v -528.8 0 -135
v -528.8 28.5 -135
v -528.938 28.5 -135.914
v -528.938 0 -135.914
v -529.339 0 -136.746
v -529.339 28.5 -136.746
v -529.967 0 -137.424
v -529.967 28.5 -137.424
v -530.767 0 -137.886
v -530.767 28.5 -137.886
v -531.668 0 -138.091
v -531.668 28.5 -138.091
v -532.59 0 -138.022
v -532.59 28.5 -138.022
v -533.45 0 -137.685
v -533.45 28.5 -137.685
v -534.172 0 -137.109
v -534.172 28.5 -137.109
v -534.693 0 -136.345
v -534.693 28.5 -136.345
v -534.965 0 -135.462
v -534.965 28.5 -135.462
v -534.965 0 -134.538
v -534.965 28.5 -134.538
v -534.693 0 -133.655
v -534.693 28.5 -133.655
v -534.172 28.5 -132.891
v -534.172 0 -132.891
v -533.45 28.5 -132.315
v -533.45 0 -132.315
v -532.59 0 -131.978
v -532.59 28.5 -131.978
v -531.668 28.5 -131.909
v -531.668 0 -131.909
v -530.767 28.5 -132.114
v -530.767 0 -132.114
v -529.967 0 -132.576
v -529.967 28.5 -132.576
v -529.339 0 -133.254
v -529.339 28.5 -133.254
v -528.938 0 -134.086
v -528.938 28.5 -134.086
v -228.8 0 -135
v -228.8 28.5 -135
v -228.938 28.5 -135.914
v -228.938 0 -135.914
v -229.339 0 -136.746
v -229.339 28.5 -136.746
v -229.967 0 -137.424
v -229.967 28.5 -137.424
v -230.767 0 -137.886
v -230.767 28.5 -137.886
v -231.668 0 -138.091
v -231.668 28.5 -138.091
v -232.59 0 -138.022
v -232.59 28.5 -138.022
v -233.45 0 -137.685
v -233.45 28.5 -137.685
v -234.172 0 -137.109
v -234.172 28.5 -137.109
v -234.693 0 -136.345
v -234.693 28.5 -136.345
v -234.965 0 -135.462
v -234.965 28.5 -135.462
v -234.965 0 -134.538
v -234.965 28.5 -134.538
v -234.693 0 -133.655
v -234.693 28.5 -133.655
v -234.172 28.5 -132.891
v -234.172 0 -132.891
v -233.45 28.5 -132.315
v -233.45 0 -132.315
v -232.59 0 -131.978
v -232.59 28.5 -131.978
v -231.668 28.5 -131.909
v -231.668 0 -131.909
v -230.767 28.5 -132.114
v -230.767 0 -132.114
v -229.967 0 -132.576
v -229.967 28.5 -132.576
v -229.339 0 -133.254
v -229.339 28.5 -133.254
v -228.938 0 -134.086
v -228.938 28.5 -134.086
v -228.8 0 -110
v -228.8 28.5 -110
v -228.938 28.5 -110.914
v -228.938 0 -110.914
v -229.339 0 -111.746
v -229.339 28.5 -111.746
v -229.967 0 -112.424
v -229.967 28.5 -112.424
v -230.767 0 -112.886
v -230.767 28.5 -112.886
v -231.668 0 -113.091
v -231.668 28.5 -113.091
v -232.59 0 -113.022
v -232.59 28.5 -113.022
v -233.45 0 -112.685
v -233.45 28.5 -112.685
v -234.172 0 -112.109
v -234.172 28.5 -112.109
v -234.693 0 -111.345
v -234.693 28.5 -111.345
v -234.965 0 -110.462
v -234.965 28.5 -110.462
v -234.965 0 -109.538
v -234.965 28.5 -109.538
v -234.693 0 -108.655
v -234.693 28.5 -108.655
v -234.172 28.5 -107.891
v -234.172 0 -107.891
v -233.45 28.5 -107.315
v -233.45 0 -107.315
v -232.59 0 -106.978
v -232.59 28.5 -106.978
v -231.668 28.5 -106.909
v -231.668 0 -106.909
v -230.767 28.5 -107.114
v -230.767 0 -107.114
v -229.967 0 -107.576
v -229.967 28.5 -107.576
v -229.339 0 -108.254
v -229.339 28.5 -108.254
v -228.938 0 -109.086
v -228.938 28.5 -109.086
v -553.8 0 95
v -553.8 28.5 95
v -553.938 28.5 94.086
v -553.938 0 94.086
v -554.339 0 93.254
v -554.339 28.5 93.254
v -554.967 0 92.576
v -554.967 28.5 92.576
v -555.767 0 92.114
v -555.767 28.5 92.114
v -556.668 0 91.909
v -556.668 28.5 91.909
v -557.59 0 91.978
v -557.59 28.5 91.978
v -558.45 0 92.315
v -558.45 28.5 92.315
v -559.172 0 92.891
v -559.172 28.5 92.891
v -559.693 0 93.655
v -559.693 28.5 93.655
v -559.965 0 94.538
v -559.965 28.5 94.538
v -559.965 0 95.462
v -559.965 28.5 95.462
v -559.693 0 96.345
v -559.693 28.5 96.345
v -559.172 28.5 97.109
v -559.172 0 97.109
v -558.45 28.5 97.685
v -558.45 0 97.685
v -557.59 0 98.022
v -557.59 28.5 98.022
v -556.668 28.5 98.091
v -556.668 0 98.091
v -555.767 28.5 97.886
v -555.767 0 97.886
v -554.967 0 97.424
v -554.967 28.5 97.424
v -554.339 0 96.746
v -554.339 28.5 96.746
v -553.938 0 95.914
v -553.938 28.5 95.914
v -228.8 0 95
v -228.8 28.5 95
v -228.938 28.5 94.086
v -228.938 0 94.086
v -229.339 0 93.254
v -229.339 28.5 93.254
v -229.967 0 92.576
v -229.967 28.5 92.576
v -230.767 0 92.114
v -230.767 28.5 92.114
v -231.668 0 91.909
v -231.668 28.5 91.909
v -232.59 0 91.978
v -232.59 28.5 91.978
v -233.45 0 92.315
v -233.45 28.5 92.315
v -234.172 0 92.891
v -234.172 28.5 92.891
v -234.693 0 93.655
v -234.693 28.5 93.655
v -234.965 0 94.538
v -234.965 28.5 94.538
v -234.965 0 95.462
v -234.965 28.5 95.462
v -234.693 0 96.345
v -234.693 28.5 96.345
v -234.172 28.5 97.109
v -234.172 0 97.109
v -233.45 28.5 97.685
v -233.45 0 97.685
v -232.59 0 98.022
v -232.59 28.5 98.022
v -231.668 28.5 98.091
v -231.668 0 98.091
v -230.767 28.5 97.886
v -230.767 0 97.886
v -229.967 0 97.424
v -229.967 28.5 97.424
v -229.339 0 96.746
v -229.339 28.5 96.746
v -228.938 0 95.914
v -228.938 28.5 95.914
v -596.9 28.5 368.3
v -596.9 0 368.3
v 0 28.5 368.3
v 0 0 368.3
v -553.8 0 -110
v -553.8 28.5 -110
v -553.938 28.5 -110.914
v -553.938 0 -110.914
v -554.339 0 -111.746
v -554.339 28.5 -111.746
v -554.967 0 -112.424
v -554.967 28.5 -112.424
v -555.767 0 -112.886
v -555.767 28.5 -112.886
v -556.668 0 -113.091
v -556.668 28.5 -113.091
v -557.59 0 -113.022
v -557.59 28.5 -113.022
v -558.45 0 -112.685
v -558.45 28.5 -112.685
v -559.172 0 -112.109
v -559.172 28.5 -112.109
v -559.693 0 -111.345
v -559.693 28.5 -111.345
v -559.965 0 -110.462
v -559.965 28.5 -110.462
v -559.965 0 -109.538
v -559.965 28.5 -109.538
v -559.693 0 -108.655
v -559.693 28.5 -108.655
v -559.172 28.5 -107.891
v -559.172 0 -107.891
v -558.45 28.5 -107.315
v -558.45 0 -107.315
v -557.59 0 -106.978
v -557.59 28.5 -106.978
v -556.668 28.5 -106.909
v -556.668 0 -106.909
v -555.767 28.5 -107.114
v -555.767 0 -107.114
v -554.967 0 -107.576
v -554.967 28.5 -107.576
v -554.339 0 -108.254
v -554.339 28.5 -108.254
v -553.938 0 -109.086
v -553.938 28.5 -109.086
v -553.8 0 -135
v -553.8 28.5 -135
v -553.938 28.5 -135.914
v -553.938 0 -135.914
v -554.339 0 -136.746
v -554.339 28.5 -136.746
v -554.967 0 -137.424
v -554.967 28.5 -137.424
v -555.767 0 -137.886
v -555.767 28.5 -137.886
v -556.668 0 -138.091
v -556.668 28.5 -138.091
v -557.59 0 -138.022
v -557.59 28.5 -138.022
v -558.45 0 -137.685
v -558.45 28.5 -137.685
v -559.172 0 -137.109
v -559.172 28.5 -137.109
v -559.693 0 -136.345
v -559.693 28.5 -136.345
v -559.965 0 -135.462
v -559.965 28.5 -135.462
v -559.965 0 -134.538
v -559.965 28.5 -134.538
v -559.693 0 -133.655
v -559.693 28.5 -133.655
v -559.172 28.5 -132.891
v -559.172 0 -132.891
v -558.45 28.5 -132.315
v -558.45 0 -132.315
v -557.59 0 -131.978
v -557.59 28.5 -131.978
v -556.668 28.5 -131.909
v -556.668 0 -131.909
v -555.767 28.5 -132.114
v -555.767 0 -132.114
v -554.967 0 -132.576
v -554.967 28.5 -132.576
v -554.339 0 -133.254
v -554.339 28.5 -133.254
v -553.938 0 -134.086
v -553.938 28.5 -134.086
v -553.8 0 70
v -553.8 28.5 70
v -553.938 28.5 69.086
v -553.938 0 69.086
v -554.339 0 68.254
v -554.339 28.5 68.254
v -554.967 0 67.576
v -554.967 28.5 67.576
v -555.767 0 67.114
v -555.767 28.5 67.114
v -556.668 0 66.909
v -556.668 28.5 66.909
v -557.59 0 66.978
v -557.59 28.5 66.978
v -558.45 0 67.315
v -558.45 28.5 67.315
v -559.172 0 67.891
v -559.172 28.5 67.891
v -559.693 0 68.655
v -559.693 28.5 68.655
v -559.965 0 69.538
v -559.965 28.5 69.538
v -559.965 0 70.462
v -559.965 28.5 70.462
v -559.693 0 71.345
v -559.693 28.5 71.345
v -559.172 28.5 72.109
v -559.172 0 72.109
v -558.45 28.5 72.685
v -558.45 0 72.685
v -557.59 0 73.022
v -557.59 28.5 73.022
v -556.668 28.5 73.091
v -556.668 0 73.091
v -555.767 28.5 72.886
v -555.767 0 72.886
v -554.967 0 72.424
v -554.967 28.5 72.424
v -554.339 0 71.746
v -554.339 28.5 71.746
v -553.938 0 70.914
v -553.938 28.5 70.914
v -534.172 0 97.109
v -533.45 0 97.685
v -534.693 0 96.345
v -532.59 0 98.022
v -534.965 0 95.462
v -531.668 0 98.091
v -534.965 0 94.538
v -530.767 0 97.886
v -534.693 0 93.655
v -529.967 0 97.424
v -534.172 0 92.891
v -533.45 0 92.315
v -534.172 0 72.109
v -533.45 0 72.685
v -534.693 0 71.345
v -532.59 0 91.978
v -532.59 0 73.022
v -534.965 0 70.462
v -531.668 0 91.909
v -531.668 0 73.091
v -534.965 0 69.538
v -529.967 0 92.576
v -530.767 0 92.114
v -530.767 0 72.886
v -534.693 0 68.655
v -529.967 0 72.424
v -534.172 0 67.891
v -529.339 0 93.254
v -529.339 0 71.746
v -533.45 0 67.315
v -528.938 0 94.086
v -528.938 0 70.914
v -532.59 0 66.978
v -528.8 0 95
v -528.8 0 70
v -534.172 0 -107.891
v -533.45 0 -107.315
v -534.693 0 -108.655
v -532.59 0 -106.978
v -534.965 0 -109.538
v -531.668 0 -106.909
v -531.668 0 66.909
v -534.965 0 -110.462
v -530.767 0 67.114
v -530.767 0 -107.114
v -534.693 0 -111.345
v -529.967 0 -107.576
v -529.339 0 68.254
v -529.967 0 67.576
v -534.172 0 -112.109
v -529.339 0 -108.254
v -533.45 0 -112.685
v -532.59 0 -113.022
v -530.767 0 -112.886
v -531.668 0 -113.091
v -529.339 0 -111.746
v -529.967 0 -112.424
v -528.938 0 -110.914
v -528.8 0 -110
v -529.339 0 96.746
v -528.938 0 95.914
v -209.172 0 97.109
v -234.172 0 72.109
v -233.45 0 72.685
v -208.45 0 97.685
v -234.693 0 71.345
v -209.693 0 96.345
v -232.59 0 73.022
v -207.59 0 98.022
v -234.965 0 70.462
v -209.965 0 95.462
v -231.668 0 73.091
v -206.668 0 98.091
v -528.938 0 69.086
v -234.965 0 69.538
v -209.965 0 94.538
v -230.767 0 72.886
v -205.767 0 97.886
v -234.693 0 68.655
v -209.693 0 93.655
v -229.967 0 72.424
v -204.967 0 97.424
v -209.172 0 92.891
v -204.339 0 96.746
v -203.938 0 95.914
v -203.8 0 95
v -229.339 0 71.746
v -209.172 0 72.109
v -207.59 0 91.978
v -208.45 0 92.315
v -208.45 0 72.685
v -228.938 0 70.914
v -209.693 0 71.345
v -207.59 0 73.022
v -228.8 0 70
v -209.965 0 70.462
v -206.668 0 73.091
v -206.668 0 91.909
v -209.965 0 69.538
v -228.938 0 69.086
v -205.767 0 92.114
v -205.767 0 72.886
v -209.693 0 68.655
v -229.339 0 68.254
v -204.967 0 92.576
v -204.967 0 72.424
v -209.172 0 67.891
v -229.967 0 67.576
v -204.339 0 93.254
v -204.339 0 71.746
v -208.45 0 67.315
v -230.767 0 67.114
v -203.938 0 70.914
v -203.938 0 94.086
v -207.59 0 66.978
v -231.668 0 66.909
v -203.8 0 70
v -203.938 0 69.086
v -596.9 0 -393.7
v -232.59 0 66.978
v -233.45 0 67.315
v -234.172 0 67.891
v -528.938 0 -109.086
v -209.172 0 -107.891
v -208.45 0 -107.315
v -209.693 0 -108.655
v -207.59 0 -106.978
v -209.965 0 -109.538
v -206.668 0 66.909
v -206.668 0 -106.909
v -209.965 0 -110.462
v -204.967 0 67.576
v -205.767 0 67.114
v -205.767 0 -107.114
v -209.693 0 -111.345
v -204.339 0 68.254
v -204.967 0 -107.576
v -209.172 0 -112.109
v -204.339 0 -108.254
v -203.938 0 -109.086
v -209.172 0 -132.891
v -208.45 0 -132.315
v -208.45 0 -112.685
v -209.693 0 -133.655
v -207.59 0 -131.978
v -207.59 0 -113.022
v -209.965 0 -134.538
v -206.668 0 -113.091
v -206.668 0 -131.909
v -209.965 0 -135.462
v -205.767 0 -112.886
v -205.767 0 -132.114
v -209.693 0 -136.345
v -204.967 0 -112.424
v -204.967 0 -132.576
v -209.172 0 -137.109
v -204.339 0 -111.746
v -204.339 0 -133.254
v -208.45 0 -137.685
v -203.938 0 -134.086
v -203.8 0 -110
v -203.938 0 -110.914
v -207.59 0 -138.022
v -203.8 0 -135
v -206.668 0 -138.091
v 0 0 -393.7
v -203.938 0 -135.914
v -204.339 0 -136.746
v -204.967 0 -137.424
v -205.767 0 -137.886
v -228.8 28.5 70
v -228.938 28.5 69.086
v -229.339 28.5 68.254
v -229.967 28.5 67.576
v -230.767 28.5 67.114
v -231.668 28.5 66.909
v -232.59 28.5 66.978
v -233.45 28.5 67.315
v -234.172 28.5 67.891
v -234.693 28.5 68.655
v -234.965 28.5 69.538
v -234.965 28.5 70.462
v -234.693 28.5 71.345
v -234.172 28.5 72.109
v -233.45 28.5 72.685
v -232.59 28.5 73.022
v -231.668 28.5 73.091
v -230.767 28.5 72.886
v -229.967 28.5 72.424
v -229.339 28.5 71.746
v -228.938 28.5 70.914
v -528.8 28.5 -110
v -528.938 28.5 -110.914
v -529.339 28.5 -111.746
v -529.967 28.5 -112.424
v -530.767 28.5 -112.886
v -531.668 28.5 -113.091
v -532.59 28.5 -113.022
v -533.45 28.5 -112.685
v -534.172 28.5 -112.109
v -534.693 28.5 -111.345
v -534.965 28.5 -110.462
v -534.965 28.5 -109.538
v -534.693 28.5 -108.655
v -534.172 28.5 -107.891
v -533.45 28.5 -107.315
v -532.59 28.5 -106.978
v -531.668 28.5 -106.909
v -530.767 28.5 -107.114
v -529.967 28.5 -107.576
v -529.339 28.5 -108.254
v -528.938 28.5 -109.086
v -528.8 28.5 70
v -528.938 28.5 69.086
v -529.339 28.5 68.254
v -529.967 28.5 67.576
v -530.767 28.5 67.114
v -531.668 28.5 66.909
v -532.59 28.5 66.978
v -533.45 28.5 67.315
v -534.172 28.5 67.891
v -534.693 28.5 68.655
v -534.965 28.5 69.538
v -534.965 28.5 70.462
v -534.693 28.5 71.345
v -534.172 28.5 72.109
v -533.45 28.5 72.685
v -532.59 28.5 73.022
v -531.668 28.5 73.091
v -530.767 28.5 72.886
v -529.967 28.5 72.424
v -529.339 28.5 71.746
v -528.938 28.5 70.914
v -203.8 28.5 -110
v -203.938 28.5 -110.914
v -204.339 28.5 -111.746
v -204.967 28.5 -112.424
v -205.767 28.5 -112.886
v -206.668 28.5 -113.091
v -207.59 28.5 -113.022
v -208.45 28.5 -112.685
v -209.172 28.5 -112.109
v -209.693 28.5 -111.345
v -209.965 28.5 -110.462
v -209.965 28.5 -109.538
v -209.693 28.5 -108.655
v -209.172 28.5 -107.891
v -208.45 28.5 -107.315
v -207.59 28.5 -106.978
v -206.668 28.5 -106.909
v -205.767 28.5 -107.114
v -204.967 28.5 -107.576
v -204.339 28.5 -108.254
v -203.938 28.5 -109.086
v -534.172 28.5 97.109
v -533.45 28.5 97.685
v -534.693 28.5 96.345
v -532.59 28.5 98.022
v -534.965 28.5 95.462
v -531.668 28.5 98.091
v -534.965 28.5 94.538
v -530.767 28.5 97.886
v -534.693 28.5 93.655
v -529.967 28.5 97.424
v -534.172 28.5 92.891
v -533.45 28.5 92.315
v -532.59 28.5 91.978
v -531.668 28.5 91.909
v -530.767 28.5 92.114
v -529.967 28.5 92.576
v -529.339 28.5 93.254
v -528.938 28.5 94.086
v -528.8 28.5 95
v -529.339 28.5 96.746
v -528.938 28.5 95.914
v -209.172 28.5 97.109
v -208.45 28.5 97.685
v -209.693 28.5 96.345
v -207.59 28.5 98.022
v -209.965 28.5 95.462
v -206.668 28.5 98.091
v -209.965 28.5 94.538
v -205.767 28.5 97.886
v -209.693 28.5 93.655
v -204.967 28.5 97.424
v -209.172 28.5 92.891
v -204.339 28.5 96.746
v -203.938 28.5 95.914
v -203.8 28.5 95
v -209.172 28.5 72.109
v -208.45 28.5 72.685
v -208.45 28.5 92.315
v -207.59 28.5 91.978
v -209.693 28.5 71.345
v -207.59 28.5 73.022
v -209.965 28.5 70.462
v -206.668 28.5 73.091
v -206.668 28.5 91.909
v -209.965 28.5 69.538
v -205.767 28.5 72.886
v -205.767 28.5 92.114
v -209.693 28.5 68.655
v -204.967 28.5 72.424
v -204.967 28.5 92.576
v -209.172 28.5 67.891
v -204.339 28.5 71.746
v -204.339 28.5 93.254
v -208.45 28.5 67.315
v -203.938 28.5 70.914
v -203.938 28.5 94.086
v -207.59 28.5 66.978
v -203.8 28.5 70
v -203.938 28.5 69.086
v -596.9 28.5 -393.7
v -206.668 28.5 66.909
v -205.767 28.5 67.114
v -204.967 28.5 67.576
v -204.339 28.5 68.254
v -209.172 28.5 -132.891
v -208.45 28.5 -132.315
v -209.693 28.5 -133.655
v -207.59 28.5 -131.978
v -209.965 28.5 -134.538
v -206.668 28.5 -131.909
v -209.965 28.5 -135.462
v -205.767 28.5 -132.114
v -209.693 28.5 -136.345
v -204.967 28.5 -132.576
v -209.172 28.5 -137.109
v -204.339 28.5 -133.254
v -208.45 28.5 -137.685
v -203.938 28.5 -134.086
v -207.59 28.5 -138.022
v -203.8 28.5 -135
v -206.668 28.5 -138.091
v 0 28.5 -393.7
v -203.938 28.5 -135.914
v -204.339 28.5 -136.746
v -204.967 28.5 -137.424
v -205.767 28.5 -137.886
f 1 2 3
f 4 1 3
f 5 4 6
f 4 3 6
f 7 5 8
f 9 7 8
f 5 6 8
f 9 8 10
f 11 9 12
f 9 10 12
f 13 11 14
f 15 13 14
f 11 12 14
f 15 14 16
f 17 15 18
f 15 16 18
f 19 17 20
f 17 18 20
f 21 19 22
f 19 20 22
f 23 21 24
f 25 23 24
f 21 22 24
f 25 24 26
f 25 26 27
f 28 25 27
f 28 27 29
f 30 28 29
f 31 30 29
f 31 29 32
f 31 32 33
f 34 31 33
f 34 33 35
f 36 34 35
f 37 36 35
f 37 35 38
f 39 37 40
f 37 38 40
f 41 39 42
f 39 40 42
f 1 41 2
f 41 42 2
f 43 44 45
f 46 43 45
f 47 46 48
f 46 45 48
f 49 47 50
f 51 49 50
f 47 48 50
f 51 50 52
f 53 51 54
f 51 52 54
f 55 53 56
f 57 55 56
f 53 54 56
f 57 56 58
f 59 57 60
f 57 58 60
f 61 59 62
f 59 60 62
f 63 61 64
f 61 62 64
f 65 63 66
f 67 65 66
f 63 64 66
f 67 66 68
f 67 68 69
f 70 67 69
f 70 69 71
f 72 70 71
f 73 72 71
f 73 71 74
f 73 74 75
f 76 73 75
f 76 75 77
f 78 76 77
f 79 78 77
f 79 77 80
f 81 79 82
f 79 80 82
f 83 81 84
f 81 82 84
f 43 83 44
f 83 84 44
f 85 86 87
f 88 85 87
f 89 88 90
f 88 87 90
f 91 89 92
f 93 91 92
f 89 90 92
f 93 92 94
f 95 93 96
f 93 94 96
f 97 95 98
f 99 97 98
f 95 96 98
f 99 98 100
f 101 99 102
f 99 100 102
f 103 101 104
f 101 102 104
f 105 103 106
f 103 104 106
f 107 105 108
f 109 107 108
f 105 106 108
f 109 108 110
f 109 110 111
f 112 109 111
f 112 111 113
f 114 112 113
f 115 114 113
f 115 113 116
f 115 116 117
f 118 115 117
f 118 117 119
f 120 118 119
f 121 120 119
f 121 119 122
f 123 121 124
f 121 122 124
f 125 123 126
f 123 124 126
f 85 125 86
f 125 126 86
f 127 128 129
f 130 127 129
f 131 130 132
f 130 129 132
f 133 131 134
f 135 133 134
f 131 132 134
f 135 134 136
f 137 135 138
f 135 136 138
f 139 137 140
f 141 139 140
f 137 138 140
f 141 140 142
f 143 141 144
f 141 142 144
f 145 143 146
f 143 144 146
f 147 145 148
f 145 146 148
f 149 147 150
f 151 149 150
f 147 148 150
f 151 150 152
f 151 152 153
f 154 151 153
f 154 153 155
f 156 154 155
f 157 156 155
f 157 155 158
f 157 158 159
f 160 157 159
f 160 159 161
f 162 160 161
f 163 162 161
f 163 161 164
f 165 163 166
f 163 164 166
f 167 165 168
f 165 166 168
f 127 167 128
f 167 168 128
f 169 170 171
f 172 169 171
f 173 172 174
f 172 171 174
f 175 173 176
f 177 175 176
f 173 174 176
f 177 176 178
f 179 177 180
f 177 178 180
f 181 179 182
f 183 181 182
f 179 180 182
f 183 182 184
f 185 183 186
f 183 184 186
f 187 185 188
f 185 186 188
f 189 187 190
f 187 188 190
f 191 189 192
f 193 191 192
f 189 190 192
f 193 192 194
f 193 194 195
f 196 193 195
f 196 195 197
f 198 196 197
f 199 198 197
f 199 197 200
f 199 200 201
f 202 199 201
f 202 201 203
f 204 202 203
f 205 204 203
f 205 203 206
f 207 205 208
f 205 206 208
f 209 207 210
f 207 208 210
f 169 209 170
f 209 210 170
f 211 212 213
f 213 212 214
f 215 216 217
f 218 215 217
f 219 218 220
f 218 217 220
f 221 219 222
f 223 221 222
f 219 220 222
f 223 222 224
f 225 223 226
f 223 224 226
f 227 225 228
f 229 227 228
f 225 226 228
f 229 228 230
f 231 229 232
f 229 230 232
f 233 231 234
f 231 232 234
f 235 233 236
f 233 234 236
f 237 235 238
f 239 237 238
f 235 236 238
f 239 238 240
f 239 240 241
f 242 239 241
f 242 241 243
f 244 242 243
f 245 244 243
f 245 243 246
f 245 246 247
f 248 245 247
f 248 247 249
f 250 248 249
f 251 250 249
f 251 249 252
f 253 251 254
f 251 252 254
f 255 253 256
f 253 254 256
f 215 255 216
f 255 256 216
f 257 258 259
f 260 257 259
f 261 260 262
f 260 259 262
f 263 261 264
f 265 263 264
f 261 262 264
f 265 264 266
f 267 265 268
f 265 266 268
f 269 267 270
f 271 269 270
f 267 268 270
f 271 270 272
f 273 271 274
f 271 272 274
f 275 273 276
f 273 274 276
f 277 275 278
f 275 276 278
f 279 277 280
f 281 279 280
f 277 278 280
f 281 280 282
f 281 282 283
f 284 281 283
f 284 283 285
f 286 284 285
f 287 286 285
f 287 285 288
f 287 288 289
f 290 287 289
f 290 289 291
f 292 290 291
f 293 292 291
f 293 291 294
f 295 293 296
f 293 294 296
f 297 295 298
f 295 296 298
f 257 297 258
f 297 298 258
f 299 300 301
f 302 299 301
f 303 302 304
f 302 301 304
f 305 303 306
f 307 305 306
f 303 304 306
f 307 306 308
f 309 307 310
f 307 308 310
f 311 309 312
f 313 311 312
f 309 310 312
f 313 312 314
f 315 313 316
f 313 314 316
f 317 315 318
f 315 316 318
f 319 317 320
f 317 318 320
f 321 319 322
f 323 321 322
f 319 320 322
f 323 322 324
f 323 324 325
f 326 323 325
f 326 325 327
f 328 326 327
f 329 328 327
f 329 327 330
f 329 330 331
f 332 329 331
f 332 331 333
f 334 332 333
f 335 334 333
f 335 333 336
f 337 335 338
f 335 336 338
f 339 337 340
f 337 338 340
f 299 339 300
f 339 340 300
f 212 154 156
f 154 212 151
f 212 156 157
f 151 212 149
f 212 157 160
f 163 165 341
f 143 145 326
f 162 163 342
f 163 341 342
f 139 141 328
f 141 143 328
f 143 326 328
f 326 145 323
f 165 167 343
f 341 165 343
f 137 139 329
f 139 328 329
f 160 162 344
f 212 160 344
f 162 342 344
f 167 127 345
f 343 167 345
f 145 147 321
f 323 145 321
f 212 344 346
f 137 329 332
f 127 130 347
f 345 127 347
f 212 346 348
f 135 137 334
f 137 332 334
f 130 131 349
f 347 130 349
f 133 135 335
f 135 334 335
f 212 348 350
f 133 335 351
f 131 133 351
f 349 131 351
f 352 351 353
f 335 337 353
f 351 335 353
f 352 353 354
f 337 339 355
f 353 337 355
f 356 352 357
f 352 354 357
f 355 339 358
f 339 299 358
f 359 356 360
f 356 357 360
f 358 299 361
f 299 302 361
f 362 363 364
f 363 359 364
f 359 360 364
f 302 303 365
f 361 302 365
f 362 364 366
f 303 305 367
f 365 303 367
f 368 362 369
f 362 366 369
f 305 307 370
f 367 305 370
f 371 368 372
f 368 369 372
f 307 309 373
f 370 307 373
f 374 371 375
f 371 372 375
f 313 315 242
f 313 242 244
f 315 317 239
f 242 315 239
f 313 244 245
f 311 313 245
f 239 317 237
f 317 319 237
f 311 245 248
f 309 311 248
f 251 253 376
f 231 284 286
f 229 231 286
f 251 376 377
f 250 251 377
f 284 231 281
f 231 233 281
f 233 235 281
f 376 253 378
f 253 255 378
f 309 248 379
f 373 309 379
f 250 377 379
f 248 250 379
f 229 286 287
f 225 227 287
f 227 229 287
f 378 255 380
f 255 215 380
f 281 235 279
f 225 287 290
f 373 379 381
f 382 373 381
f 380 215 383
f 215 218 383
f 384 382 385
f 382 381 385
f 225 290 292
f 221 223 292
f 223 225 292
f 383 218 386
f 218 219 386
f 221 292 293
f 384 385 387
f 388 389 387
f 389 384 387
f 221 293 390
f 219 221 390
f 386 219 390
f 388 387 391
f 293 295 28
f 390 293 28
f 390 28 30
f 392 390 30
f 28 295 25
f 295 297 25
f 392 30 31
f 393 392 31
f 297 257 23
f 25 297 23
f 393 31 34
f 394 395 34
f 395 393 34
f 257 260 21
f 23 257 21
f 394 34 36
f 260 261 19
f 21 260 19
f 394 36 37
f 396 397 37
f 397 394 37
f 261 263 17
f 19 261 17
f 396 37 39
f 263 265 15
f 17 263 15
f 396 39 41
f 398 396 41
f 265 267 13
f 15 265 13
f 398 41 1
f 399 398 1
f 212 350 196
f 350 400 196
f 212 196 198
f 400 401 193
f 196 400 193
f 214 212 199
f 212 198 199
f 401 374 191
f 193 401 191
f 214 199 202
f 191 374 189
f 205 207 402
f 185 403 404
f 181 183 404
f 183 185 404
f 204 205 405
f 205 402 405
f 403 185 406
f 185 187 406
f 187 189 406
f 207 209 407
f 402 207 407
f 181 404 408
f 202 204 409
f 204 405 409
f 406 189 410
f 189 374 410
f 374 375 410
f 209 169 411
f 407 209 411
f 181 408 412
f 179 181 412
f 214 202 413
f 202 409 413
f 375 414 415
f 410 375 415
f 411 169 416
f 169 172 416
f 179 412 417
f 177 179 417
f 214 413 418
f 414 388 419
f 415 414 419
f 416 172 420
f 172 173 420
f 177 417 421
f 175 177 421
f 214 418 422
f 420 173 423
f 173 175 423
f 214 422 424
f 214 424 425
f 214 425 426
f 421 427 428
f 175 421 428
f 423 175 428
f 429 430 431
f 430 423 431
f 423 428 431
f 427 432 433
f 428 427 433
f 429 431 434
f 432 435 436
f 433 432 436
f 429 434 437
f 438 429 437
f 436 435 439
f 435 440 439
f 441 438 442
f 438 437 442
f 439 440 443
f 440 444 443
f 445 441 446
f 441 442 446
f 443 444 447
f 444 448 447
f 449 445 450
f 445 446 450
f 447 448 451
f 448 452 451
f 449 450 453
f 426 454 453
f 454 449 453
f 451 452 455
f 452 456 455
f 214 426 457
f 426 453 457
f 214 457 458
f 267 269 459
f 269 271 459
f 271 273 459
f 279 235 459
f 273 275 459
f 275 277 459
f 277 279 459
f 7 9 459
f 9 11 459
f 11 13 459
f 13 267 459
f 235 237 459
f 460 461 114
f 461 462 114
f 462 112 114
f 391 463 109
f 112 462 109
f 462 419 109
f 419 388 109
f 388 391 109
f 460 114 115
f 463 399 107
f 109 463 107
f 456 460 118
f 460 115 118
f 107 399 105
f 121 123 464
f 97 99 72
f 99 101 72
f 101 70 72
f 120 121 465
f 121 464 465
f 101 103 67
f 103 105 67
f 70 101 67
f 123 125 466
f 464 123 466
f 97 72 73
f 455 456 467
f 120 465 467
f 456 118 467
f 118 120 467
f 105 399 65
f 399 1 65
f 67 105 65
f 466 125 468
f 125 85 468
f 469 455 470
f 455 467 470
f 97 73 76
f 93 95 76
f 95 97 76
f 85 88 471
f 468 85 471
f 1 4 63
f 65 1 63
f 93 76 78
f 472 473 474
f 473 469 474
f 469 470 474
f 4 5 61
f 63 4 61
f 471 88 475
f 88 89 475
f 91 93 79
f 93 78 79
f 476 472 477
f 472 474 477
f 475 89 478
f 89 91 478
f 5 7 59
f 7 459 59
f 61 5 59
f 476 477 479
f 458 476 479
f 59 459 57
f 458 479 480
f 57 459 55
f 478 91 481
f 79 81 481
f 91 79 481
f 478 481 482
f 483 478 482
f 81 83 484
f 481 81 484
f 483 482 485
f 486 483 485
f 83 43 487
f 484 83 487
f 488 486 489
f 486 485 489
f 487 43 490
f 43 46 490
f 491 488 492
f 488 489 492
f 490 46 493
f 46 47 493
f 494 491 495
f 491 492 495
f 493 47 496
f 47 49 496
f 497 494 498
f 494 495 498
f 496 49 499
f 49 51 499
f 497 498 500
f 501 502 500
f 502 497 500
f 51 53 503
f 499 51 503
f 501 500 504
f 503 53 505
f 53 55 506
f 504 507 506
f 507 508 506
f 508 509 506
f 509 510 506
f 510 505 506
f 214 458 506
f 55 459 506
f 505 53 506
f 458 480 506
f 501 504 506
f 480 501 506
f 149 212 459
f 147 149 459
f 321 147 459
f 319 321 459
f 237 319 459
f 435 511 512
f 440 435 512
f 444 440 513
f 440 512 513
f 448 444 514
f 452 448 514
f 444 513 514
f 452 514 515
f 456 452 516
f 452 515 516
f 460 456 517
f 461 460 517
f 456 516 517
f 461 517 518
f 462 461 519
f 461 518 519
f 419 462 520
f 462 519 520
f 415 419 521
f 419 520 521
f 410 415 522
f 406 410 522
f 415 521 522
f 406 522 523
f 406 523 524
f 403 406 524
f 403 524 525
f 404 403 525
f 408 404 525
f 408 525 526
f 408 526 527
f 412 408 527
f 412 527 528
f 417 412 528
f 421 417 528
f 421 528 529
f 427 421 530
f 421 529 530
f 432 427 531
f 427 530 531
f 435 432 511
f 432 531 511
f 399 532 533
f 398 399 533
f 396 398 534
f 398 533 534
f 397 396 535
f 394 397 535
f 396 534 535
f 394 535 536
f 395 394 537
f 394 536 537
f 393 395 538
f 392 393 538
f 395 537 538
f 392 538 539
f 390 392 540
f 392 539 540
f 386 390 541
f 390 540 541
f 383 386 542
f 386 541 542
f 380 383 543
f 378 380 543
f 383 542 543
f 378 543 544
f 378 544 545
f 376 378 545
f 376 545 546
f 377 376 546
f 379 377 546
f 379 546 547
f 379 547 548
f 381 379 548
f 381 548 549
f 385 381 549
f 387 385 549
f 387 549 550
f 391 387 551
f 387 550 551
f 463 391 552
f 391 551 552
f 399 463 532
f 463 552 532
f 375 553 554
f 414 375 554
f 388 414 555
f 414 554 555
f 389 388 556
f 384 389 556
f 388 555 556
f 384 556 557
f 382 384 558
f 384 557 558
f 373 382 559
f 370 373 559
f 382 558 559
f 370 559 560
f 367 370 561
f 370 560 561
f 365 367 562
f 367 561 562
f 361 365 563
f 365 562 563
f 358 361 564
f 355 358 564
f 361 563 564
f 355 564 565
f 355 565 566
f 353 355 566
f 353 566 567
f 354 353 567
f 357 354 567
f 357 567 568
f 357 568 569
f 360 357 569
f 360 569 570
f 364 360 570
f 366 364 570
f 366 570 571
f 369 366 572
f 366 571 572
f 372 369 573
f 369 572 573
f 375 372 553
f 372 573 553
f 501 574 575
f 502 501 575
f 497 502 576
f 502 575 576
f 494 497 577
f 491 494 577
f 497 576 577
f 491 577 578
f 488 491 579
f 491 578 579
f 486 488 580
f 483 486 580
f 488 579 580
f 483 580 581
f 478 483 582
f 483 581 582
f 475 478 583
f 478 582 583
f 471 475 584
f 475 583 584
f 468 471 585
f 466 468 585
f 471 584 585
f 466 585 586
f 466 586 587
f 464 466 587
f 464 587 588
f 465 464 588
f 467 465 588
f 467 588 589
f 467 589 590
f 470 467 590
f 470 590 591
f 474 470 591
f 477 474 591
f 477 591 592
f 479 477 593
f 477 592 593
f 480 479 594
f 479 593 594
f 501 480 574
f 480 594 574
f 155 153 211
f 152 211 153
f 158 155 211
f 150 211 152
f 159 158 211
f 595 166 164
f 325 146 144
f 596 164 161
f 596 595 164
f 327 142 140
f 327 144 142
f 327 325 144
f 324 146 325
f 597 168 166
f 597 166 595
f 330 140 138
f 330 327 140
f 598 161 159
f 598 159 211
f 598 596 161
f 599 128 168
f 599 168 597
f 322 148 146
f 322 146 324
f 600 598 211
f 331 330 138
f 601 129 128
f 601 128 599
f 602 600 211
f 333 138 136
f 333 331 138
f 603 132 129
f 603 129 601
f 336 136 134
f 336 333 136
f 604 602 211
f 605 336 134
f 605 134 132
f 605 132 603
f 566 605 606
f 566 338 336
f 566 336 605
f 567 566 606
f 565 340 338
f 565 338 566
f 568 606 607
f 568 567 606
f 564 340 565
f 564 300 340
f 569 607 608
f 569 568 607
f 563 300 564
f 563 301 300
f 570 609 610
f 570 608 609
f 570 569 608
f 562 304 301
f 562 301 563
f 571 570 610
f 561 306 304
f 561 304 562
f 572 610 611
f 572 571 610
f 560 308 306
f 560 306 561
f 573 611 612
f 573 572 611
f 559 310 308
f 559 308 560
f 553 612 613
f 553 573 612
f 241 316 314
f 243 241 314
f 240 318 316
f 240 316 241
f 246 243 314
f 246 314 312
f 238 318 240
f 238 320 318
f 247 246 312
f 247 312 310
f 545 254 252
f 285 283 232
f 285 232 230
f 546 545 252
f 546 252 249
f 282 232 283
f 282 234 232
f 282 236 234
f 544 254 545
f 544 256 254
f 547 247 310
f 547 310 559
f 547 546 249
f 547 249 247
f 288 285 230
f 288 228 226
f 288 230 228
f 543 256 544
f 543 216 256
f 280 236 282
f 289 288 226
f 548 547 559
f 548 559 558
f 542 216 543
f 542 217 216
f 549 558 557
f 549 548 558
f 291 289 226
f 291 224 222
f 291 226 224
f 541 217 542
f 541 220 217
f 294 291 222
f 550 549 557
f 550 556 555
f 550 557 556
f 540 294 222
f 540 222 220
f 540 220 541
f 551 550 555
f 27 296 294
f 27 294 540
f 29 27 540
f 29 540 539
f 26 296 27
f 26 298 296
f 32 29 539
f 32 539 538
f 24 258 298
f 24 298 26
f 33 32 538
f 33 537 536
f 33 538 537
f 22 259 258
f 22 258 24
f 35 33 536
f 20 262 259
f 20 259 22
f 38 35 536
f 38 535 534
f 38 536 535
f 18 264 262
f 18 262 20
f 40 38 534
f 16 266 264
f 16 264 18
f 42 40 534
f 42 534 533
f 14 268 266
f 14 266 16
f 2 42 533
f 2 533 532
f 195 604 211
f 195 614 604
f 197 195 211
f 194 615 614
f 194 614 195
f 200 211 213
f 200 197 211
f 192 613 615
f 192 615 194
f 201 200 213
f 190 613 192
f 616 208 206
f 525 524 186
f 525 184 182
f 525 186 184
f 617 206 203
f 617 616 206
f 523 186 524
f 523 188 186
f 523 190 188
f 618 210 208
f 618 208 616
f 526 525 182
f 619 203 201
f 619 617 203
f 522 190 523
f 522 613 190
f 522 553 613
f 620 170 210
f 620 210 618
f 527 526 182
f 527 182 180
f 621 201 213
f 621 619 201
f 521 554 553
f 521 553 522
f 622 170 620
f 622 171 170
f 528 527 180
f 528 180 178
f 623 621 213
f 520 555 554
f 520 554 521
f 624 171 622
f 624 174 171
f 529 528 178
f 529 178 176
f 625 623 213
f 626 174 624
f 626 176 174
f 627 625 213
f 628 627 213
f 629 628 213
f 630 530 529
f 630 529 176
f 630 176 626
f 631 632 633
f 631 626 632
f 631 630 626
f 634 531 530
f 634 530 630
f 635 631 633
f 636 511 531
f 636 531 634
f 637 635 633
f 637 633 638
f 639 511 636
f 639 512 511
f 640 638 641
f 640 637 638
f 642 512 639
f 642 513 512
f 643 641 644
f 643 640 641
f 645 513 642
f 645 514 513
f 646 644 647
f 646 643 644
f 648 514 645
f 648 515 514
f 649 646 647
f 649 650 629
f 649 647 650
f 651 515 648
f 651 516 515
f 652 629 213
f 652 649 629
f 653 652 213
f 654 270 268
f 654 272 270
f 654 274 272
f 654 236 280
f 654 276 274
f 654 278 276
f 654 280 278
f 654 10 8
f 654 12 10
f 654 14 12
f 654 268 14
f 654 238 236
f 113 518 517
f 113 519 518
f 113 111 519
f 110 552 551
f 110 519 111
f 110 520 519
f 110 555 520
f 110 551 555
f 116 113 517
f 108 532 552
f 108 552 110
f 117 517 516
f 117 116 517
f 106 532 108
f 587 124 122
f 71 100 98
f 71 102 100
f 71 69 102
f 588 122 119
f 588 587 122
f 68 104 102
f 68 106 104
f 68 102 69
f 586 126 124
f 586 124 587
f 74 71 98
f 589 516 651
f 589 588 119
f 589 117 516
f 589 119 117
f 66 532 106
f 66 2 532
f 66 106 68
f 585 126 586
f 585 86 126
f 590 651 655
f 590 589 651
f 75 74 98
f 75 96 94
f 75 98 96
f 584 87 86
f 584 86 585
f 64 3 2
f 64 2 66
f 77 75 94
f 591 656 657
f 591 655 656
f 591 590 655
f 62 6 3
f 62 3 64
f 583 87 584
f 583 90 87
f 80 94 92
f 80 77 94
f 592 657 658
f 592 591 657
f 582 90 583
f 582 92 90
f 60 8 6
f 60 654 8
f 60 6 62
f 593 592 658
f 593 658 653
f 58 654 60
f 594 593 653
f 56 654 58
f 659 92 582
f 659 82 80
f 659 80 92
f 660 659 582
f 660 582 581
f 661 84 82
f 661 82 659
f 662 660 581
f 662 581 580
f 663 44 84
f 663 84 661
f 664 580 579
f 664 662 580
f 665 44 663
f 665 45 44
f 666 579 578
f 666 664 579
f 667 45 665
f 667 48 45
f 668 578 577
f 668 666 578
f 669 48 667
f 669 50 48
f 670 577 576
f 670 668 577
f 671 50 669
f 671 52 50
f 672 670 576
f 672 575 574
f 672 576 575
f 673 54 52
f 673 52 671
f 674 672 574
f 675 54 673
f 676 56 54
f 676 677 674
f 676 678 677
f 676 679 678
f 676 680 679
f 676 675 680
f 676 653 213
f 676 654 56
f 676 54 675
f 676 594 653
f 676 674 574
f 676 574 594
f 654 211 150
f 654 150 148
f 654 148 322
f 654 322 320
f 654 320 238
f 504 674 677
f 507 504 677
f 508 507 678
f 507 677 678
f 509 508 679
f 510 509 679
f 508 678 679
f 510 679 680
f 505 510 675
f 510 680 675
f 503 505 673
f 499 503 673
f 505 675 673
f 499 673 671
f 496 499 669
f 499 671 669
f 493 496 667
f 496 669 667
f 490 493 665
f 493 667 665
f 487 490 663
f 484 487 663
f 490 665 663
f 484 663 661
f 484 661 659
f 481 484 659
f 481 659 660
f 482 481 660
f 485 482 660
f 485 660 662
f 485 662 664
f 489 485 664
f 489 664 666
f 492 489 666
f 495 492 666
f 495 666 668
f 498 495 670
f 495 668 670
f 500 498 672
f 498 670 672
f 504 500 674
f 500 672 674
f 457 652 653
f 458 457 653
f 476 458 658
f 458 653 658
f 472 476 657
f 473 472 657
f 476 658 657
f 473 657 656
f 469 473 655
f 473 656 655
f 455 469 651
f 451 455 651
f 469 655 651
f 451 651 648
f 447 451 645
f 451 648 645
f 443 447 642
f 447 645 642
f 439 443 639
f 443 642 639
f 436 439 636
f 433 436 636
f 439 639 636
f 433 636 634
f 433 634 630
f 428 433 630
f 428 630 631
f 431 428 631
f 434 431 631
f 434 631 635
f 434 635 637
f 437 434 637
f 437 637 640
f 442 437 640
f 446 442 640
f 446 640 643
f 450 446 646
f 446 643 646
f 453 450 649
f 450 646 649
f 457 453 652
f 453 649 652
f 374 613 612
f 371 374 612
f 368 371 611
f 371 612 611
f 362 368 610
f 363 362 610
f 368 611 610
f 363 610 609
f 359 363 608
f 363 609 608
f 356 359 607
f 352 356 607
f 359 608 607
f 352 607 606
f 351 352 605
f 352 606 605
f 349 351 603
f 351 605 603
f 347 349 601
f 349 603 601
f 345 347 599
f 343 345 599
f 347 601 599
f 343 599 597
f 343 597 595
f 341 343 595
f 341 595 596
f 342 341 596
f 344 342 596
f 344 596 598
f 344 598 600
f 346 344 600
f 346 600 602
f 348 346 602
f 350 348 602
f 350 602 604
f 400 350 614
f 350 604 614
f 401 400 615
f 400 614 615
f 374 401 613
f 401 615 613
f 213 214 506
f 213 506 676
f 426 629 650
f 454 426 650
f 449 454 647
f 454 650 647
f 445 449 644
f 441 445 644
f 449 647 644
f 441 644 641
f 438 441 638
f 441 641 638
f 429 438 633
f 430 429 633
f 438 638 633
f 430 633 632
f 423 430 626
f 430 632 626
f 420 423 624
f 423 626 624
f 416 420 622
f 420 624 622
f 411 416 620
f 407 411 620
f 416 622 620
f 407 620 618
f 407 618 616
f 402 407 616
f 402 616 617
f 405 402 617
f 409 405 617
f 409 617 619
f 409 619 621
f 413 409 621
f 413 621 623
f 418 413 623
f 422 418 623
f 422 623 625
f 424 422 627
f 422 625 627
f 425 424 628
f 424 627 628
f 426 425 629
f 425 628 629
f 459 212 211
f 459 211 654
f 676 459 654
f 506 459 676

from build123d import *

# Parameters (mm, degrees)
SKETCH1_W               = 1028.7
SKETCH1_H               = 50.8
BOSS_EXTRUDE1_DEPTH     = 704.85
SKETCH2_W               = 508
SKETCH2_H               = 100
SKETCH2_H_2             = 403.25
CUT_EXTRUDE1_DEPTH      = 585.2
CUT_EXTRUDE1_DEPTH_BACK = 585.2
SKETCH3_W               = 1193.8
SKETCH3_H               = 762
BOSS_EXTRUDE2_DEPTH     = 28.5
SKETCH4_R               = 3.1
CUT_EXTRUDE2_DEPTH      = 28.5
SKETCH5_R               = 1000
SKETCH5_W               = 596.9
SKETCH5_H               = 28.5
CUT_EXTRUDE3_DEPTH      = 369.3
CUT_EXTRUDE3_DEPTH_BACK = 394.7


with BuildPart() as part:
    # Sketch1 → Boss-Extrude1 (new body)
    with BuildSketch(Plane(origin=(0, 0, 0), x_dir=(1, 0, 0), z_dir=(0, 1, 0))):
        Polygon((-584.2, 355.6), (-584.2, 254), (-552.45, 254), (-514.35, 254), (-482.6, 254), (-482.6, 355.6), align=None)
        Polygon((584.2, 355.6), (482.6, 355.6), (482.6, 254), (514.35, 254), (552.45, 254), (584.2, 254), align=None)
        Polygon((482.6, -254), (482.6, -355.6), (584.2, -355.6), (584.2, -254), (552.45, -254), (514.35, -254), align=None)
        Polygon((-552.45, -254), (-584.2, -254), (-584.2, -355.6), (-482.6, -355.6), (-482.6, -254), (-514.35, -254), align=None)
        Polygon((-514.35, 254), (-552.45, 254), (-552.45, -254), (-514.35, -254), (-514.35, -25.4), (-514.35, 25.4), align=None)
        Rectangle(SKETCH1_W, SKETCH1_H)
        Polygon((514.35, 254), (514.35, 25.4), (514.35, -25.4), (514.35, -254), (552.45, -254), (552.45, 254), align=None)
    extrude(amount=-BOSS_EXTRUDE1_DEPTH)

    # Sketch2 → Cut-Extrude1 (cut, two sides)
    with BuildSketch(Plane(origin=(0, 0, 0), x_dir=(0, 0, -1), z_dir=(1, 0, 0))) as cut_extrude1_sk:
        with Locations((0, -50)):
            Rectangle(SKETCH2_W, SKETCH2_H)
        with Locations((0, -352.425)):
            Rectangle(SKETCH2_W, SKETCH2_H_2)
        with Locations((0, -654.85)):
            Rectangle(SKETCH2_W, SKETCH2_H)
    extrude(amount=CUT_EXTRUDE1_DEPTH, mode=Mode.SUBTRACT)
    extrude(cut_extrude1_sk.sketch, amount=-CUT_EXTRUDE1_DEPTH_BACK, mode=Mode.SUBTRACT)


with BuildPart() as body_2:
    # Sketch3 → Boss-Extrude2 (new body)
    with BuildSketch(Plane(origin=(0, 0, 0), x_dir=(1, 0, 0), z_dir=(0, 1, 0))):
        with Locations((0, 12.7)):
            Rectangle(SKETCH3_W, SKETCH3_H)
    extrude(amount=BOSS_EXTRUDE2_DEPTH)

    # Sketch4 → Cut-Extrude2 (cut)
    with BuildSketch(Plane(origin=(0, 28.5, 0), x_dir=(1, 0, 0), z_dir=(0, 1, 0))):
        with Locations((-556.9, 110)):
            Circle(SKETCH4_R)
        with Locations((-531.9, 110)):
            Circle(SKETCH4_R)
        with Locations((-531.9, 135)):
            Circle(SKETCH4_R)
        with Locations((-556.9, 135)):
            Circle(SKETCH4_R)
        with Locations((-231.9, 135)):
            Circle(SKETCH4_R)
        with Locations((-206.9, 135)):
            Circle(SKETCH4_R)
        with Locations((-231.9, 110)):
            Circle(SKETCH4_R)
        with Locations((-206.9, 110)):
            Circle(SKETCH4_R)
        with Locations((-206.9, -70)):
            Circle(SKETCH4_R)
        with Locations((-231.9, -70)):
            Circle(SKETCH4_R)
        with Locations((-231.9, -95)):
            Circle(SKETCH4_R)
        with Locations((-206.9, -95)):
            Circle(SKETCH4_R)
        with Locations((-531.9, -70)):
            Circle(SKETCH4_R)
        with Locations((-531.9, -95)):
            Circle(SKETCH4_R)
        with Locations((-556.9, -70)):
            Circle(SKETCH4_R)
        with Locations((-556.9, -95)):
            Circle(SKETCH4_R)
    cut_extrude2 = extrude(amount=-CUT_EXTRUDE2_DEPTH, mode=Mode.SUBTRACT)

    # Mirror1: Cut-Extrude2 across plane
    add(cut_extrude2.mirror(Plane(origin=(0, 0, 0), x_dir=(0, 0, 1), z_dir=(1, 0, 0))), mode=Mode.SUBTRACT)


with BuildPart() as cut_extrude3_tool:
    # Sketch5 → Cut-Extrude3 (new body, two sides)
    with BuildSketch(Plane.XY) as cut_extrude3_sk:
        Circle(SKETCH5_R)
        with Locations((-298.45, 14.25)):
            Rectangle(SKETCH5_W, SKETCH5_H, mode=Mode.SUBTRACT)
    extrude(amount=CUT_EXTRUDE3_DEPTH)
    extrude(cut_extrude3_sk.sketch, amount=-CUT_EXTRUDE3_DEPTH_BACK)


with BuildPart() as part_1:
    add(part.part)

    # Cut-Extrude3: cut by cut_extrude3_tool
    add(cut_extrude3_tool.part, mode=Mode.SUBTRACT)


with BuildPart() as body_2_1:
    add(body_2.part)

    # Cut-Extrude3: cut by cut_extrude3_tool
    add(cut_extrude3_tool.part, mode=Mode.SUBTRACT)


solid = body_2_1.part
